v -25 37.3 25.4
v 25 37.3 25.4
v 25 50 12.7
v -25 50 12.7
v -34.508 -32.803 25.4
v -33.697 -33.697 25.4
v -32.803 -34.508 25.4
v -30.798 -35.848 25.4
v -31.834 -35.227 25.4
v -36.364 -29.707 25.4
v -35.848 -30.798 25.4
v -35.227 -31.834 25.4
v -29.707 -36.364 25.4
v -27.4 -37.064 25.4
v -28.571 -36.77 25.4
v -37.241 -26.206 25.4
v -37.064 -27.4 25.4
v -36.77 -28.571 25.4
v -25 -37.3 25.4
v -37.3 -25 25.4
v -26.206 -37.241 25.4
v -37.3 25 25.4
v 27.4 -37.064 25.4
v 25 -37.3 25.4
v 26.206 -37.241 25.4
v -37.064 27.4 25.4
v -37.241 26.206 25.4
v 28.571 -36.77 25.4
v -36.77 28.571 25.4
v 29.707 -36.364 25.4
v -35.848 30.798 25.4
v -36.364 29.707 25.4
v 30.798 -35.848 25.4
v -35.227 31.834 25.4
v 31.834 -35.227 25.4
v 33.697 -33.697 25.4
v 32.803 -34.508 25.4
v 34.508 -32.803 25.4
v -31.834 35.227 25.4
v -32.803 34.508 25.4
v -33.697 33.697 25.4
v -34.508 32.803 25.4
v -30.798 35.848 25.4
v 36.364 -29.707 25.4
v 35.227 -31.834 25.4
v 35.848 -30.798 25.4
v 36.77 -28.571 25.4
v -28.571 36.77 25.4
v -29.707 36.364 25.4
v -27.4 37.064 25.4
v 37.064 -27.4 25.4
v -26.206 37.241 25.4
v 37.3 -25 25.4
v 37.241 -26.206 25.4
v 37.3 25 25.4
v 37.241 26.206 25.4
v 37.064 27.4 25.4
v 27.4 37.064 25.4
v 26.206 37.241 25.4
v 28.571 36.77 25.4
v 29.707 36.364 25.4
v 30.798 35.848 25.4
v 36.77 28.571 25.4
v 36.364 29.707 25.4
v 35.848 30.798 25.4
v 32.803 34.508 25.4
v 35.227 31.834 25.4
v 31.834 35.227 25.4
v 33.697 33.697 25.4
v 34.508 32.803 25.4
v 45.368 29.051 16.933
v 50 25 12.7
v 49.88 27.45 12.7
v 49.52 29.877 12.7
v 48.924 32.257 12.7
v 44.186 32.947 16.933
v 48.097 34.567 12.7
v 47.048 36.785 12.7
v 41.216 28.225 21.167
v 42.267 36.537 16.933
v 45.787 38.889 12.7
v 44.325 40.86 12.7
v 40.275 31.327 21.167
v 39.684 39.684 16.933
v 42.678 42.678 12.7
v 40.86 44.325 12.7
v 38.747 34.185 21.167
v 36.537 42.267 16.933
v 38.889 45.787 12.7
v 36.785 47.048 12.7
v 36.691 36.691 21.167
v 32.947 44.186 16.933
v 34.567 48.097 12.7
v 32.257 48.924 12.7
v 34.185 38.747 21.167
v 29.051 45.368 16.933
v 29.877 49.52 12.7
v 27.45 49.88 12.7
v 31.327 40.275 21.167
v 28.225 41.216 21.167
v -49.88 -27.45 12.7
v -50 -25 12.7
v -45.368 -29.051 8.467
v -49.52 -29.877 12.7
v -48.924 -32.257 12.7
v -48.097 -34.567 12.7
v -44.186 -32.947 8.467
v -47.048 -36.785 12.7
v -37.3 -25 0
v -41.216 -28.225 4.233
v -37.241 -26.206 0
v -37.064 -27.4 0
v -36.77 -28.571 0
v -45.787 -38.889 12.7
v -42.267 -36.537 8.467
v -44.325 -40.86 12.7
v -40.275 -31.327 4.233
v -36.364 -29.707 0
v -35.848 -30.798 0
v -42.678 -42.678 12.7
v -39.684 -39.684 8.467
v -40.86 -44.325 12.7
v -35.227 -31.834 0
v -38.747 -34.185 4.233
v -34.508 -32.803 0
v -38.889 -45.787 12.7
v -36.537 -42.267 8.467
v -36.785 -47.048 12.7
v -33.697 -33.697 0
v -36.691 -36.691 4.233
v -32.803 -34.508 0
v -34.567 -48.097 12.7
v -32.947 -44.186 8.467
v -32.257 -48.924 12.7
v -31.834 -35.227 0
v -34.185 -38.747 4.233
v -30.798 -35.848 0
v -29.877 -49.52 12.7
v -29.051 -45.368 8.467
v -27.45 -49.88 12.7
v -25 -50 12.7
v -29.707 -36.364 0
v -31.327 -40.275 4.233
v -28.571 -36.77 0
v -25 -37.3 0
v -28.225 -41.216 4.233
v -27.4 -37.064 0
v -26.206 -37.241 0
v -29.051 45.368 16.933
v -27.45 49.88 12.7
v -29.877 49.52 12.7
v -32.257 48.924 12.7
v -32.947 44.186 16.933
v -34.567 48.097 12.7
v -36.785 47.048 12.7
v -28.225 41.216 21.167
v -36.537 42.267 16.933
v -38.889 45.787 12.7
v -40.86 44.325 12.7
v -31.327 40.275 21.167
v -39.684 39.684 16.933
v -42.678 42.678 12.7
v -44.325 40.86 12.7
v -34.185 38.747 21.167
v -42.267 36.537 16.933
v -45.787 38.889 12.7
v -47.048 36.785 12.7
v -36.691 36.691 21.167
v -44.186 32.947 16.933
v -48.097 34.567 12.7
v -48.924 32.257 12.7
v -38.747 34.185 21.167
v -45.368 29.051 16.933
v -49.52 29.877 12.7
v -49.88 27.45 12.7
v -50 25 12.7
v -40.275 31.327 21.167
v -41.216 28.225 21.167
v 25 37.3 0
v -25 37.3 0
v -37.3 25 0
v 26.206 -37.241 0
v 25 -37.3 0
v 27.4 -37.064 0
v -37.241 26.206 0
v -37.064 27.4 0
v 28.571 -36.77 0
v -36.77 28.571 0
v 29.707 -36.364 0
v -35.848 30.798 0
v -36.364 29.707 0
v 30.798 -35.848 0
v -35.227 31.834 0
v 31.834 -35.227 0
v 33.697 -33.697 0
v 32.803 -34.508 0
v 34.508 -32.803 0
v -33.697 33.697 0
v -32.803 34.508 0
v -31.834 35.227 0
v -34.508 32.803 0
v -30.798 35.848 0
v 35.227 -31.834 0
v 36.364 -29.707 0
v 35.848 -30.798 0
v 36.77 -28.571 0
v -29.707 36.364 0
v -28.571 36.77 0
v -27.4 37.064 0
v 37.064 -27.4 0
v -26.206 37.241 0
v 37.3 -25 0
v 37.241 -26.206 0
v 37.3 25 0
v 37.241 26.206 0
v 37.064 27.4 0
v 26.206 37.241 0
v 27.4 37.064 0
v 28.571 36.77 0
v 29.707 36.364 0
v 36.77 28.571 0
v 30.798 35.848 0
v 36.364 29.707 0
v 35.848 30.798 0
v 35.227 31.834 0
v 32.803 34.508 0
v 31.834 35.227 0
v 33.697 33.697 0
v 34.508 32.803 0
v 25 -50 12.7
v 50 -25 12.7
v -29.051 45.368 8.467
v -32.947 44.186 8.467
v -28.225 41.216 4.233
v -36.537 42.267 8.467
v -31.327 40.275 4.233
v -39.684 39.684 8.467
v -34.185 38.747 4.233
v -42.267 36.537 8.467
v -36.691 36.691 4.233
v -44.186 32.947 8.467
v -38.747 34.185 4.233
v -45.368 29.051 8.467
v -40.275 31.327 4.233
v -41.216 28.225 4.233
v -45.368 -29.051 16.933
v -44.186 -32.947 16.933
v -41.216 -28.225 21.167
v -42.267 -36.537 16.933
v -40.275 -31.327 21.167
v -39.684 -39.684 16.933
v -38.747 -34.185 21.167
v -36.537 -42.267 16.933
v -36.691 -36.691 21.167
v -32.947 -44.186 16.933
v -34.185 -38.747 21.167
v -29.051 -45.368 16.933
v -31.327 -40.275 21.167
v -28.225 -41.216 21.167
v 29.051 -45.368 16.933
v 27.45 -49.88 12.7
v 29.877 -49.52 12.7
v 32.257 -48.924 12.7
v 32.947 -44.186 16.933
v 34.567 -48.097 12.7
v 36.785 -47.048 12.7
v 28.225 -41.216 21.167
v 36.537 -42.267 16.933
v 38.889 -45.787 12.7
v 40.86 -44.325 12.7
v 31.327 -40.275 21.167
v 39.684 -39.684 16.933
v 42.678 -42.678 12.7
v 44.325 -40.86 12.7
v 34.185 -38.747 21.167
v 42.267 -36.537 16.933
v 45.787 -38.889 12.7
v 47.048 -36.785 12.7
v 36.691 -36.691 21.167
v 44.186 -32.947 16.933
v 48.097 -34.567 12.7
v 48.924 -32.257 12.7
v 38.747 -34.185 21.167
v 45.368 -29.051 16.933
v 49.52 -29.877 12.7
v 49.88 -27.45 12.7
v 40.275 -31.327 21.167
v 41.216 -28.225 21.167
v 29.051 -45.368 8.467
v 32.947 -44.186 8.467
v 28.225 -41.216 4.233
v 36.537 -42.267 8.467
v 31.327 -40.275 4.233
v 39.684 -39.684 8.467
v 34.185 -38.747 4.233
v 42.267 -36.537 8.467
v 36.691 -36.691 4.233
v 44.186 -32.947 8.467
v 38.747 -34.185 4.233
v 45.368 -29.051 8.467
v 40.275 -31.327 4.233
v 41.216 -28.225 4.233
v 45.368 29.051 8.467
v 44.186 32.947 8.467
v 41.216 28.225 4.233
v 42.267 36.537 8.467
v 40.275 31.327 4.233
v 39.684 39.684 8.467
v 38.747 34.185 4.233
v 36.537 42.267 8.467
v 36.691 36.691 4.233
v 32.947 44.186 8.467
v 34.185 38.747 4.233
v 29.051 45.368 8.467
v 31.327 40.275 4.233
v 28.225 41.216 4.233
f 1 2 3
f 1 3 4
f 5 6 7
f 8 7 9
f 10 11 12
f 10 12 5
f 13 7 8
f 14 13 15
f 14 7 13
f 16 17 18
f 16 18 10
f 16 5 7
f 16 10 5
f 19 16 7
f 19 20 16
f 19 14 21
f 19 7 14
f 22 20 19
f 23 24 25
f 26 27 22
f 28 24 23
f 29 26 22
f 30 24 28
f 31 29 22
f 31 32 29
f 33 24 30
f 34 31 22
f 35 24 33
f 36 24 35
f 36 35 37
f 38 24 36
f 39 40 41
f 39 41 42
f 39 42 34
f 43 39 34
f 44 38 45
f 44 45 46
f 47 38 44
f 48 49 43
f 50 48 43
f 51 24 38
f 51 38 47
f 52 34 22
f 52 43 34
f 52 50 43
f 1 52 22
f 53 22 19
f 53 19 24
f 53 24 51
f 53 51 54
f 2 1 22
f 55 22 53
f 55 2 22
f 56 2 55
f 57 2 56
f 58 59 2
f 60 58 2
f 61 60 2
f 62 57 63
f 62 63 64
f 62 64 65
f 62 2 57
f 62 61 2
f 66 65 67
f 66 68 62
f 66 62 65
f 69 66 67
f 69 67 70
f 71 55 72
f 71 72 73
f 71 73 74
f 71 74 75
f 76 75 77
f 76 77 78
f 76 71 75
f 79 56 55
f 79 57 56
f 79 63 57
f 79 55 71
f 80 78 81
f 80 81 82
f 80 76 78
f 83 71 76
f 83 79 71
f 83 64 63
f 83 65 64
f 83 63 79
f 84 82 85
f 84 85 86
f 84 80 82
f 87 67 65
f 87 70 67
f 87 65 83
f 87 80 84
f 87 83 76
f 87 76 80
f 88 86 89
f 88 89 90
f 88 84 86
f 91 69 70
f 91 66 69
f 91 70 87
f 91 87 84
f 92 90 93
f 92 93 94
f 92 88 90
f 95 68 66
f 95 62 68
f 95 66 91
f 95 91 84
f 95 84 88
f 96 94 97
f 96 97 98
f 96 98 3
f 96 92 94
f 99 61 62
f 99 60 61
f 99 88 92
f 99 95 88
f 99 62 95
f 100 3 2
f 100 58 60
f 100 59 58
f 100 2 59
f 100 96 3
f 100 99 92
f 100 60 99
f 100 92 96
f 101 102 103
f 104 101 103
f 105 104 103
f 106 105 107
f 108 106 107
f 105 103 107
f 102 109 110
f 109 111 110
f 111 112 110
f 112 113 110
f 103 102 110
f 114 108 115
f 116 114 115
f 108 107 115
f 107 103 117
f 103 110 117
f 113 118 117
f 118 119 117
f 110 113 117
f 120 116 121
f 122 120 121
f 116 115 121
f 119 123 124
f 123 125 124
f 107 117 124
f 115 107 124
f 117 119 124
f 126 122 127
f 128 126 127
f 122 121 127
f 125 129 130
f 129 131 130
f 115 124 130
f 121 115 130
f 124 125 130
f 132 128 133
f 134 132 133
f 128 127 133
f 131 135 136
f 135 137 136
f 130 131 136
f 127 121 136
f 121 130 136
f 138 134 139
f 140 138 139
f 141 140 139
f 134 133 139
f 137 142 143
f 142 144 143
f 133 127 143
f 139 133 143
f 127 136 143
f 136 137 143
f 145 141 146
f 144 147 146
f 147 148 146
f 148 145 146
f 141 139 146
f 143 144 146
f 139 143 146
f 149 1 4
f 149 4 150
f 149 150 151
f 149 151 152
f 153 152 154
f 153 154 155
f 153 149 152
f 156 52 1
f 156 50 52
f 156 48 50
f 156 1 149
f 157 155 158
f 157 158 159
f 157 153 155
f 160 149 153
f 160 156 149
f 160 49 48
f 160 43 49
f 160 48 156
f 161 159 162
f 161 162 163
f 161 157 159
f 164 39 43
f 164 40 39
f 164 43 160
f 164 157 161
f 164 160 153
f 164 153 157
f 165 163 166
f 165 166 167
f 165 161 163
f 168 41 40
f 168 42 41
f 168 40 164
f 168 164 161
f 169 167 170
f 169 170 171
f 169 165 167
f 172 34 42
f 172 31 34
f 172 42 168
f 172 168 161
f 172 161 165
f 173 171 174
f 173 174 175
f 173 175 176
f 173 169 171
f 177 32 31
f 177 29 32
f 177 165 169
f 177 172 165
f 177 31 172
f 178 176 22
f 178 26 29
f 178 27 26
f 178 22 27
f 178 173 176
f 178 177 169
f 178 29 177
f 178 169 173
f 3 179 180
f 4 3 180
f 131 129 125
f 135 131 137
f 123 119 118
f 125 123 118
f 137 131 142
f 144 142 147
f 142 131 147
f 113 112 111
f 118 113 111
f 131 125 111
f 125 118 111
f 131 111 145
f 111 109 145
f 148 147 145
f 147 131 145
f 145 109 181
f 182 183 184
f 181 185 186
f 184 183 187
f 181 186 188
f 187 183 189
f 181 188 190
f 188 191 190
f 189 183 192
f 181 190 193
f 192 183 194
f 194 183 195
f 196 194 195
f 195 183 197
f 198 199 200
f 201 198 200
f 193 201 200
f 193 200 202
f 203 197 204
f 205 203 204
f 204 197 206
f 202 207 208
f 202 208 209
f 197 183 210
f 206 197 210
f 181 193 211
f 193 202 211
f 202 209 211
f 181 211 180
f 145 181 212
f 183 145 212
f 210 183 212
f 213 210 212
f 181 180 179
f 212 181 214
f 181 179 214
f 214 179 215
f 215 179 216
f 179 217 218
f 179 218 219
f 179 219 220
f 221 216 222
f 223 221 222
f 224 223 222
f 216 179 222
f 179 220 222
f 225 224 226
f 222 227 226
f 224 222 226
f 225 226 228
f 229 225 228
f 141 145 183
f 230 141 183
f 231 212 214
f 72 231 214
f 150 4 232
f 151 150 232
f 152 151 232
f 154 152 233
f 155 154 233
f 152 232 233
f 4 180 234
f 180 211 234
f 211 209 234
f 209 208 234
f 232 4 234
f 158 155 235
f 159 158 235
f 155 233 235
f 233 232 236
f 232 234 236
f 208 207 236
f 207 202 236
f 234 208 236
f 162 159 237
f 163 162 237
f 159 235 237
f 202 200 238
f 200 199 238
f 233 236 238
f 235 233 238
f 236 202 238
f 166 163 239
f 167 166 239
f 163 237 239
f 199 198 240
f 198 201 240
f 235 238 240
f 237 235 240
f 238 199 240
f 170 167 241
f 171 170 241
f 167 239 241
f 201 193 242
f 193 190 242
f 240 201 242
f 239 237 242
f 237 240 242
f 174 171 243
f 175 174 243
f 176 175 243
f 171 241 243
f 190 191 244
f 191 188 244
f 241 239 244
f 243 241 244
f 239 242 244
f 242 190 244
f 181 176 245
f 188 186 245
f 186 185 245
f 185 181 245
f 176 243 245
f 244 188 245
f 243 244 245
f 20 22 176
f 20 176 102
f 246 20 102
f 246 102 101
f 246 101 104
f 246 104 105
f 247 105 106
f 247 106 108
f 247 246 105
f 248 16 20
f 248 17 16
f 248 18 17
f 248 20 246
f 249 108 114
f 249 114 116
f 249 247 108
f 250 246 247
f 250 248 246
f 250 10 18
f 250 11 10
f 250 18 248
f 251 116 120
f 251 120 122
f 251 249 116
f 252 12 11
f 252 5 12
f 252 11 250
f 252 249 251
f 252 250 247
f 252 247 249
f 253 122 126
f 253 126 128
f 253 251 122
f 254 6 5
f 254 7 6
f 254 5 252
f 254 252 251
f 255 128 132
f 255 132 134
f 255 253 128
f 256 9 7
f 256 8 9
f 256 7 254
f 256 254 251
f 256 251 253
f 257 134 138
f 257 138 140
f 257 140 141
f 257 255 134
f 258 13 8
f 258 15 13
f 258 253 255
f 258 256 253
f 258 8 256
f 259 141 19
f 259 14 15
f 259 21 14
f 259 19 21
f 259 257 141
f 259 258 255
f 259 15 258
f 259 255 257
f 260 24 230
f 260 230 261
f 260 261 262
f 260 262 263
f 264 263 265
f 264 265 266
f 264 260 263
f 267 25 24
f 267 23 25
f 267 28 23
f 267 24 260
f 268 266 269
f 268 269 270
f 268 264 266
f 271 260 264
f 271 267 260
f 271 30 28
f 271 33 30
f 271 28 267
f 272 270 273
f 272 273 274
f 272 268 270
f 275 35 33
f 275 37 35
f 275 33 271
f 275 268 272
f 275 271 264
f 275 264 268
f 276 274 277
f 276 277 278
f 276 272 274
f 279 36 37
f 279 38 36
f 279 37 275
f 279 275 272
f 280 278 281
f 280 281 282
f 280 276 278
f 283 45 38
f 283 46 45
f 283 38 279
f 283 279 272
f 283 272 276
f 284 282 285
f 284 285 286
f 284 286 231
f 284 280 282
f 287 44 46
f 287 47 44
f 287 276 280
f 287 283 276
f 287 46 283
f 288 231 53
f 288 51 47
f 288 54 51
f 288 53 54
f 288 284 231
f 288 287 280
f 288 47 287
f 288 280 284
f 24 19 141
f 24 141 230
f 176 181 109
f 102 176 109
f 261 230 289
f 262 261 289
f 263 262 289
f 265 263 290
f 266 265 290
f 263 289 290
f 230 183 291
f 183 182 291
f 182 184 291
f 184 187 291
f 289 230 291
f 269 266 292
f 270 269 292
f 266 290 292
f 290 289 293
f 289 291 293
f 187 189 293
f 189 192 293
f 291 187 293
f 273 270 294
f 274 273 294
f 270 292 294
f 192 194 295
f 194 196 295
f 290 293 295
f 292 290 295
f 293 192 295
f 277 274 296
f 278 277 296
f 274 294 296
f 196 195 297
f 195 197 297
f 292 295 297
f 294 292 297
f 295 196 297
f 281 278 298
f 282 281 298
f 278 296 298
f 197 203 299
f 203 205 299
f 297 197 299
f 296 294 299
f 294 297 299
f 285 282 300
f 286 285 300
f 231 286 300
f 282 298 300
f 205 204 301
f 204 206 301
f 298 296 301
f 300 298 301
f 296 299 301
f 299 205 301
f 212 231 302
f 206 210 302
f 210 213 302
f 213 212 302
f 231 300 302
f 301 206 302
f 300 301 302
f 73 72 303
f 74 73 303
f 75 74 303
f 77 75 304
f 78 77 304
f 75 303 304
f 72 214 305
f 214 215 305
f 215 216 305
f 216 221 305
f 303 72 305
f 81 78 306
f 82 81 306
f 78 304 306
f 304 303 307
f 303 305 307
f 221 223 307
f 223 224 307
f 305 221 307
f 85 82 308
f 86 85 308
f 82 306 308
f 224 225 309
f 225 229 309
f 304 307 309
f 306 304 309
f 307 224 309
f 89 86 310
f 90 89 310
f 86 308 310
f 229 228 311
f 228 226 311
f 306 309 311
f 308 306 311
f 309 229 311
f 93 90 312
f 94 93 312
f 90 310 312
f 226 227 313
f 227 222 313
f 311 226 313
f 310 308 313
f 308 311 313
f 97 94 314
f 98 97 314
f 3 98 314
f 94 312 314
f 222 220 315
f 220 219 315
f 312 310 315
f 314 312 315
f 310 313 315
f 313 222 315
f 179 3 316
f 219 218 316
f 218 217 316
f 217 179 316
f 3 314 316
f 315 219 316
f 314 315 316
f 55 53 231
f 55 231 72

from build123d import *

# Parameters (mm, degrees)
F1_DEPTH = 25.4
F2_SIZE  = 12.69999


# Not quite as in the source:
# - a fillet or chamfer is up to 0.001 mm smaller than in the source, because OpenCascade refuses the exact size


with BuildPart() as f1:
    # F0 (on Top) → F1 (new body)
    with BuildSketch(Plane.XY):
        with BuildLine():
            ThreePointArc((50, 25), (42.6776695297, 42.6776695297), (25, 50))
            Line((25, 50), (-25, 50))
            ThreePointArc((-25, 50), (-42.6776695297, 42.6776695297), (-50, 25))
            Line((-50, 25), (-50, -25))
            ThreePointArc((-50, -25), (-42.6776695297, -42.6776695297), (-25, -50))
            Line((-25, -50), (25, -50))
            ThreePointArc((25, -50), (42.6776695297, -42.6776695297), (50, -25))
            Line((50, -25), (50, 25))
        make_face()
    extrude(amount=F1_DEPTH)

    # F2 (size 12.7 in the source; OpenCascade refuses exactly that, so slightly less here)
    f2_edges = [f1.edges().sort_by_distance(p)[0] for p in [
        (42.67767, 42.67767, 25.4),
        (0, 50, 25.4),
        (-42.67767, 42.67767, 25.4),
        (-50, 0, 25.4),
        (-42.67767, -42.67767, 25.4),
        (0, -50, 25.4),
        (42.67767, -42.67767, 25.4),
        (50, 0, 25.4),
        (42.67767, 42.67767, 0),
        (0, 50, 0),
        (-42.67767, 42.67767, 0),
        (-50, 0, 0),
        (-42.67767, -42.67767, 0),
        (0, -50, 0),
        (42.67767, -42.67767, 0),
        (50, 0, 0),
    ]]
    chamfer(f2_edges, length=F2_SIZE)


solid = f1.part
